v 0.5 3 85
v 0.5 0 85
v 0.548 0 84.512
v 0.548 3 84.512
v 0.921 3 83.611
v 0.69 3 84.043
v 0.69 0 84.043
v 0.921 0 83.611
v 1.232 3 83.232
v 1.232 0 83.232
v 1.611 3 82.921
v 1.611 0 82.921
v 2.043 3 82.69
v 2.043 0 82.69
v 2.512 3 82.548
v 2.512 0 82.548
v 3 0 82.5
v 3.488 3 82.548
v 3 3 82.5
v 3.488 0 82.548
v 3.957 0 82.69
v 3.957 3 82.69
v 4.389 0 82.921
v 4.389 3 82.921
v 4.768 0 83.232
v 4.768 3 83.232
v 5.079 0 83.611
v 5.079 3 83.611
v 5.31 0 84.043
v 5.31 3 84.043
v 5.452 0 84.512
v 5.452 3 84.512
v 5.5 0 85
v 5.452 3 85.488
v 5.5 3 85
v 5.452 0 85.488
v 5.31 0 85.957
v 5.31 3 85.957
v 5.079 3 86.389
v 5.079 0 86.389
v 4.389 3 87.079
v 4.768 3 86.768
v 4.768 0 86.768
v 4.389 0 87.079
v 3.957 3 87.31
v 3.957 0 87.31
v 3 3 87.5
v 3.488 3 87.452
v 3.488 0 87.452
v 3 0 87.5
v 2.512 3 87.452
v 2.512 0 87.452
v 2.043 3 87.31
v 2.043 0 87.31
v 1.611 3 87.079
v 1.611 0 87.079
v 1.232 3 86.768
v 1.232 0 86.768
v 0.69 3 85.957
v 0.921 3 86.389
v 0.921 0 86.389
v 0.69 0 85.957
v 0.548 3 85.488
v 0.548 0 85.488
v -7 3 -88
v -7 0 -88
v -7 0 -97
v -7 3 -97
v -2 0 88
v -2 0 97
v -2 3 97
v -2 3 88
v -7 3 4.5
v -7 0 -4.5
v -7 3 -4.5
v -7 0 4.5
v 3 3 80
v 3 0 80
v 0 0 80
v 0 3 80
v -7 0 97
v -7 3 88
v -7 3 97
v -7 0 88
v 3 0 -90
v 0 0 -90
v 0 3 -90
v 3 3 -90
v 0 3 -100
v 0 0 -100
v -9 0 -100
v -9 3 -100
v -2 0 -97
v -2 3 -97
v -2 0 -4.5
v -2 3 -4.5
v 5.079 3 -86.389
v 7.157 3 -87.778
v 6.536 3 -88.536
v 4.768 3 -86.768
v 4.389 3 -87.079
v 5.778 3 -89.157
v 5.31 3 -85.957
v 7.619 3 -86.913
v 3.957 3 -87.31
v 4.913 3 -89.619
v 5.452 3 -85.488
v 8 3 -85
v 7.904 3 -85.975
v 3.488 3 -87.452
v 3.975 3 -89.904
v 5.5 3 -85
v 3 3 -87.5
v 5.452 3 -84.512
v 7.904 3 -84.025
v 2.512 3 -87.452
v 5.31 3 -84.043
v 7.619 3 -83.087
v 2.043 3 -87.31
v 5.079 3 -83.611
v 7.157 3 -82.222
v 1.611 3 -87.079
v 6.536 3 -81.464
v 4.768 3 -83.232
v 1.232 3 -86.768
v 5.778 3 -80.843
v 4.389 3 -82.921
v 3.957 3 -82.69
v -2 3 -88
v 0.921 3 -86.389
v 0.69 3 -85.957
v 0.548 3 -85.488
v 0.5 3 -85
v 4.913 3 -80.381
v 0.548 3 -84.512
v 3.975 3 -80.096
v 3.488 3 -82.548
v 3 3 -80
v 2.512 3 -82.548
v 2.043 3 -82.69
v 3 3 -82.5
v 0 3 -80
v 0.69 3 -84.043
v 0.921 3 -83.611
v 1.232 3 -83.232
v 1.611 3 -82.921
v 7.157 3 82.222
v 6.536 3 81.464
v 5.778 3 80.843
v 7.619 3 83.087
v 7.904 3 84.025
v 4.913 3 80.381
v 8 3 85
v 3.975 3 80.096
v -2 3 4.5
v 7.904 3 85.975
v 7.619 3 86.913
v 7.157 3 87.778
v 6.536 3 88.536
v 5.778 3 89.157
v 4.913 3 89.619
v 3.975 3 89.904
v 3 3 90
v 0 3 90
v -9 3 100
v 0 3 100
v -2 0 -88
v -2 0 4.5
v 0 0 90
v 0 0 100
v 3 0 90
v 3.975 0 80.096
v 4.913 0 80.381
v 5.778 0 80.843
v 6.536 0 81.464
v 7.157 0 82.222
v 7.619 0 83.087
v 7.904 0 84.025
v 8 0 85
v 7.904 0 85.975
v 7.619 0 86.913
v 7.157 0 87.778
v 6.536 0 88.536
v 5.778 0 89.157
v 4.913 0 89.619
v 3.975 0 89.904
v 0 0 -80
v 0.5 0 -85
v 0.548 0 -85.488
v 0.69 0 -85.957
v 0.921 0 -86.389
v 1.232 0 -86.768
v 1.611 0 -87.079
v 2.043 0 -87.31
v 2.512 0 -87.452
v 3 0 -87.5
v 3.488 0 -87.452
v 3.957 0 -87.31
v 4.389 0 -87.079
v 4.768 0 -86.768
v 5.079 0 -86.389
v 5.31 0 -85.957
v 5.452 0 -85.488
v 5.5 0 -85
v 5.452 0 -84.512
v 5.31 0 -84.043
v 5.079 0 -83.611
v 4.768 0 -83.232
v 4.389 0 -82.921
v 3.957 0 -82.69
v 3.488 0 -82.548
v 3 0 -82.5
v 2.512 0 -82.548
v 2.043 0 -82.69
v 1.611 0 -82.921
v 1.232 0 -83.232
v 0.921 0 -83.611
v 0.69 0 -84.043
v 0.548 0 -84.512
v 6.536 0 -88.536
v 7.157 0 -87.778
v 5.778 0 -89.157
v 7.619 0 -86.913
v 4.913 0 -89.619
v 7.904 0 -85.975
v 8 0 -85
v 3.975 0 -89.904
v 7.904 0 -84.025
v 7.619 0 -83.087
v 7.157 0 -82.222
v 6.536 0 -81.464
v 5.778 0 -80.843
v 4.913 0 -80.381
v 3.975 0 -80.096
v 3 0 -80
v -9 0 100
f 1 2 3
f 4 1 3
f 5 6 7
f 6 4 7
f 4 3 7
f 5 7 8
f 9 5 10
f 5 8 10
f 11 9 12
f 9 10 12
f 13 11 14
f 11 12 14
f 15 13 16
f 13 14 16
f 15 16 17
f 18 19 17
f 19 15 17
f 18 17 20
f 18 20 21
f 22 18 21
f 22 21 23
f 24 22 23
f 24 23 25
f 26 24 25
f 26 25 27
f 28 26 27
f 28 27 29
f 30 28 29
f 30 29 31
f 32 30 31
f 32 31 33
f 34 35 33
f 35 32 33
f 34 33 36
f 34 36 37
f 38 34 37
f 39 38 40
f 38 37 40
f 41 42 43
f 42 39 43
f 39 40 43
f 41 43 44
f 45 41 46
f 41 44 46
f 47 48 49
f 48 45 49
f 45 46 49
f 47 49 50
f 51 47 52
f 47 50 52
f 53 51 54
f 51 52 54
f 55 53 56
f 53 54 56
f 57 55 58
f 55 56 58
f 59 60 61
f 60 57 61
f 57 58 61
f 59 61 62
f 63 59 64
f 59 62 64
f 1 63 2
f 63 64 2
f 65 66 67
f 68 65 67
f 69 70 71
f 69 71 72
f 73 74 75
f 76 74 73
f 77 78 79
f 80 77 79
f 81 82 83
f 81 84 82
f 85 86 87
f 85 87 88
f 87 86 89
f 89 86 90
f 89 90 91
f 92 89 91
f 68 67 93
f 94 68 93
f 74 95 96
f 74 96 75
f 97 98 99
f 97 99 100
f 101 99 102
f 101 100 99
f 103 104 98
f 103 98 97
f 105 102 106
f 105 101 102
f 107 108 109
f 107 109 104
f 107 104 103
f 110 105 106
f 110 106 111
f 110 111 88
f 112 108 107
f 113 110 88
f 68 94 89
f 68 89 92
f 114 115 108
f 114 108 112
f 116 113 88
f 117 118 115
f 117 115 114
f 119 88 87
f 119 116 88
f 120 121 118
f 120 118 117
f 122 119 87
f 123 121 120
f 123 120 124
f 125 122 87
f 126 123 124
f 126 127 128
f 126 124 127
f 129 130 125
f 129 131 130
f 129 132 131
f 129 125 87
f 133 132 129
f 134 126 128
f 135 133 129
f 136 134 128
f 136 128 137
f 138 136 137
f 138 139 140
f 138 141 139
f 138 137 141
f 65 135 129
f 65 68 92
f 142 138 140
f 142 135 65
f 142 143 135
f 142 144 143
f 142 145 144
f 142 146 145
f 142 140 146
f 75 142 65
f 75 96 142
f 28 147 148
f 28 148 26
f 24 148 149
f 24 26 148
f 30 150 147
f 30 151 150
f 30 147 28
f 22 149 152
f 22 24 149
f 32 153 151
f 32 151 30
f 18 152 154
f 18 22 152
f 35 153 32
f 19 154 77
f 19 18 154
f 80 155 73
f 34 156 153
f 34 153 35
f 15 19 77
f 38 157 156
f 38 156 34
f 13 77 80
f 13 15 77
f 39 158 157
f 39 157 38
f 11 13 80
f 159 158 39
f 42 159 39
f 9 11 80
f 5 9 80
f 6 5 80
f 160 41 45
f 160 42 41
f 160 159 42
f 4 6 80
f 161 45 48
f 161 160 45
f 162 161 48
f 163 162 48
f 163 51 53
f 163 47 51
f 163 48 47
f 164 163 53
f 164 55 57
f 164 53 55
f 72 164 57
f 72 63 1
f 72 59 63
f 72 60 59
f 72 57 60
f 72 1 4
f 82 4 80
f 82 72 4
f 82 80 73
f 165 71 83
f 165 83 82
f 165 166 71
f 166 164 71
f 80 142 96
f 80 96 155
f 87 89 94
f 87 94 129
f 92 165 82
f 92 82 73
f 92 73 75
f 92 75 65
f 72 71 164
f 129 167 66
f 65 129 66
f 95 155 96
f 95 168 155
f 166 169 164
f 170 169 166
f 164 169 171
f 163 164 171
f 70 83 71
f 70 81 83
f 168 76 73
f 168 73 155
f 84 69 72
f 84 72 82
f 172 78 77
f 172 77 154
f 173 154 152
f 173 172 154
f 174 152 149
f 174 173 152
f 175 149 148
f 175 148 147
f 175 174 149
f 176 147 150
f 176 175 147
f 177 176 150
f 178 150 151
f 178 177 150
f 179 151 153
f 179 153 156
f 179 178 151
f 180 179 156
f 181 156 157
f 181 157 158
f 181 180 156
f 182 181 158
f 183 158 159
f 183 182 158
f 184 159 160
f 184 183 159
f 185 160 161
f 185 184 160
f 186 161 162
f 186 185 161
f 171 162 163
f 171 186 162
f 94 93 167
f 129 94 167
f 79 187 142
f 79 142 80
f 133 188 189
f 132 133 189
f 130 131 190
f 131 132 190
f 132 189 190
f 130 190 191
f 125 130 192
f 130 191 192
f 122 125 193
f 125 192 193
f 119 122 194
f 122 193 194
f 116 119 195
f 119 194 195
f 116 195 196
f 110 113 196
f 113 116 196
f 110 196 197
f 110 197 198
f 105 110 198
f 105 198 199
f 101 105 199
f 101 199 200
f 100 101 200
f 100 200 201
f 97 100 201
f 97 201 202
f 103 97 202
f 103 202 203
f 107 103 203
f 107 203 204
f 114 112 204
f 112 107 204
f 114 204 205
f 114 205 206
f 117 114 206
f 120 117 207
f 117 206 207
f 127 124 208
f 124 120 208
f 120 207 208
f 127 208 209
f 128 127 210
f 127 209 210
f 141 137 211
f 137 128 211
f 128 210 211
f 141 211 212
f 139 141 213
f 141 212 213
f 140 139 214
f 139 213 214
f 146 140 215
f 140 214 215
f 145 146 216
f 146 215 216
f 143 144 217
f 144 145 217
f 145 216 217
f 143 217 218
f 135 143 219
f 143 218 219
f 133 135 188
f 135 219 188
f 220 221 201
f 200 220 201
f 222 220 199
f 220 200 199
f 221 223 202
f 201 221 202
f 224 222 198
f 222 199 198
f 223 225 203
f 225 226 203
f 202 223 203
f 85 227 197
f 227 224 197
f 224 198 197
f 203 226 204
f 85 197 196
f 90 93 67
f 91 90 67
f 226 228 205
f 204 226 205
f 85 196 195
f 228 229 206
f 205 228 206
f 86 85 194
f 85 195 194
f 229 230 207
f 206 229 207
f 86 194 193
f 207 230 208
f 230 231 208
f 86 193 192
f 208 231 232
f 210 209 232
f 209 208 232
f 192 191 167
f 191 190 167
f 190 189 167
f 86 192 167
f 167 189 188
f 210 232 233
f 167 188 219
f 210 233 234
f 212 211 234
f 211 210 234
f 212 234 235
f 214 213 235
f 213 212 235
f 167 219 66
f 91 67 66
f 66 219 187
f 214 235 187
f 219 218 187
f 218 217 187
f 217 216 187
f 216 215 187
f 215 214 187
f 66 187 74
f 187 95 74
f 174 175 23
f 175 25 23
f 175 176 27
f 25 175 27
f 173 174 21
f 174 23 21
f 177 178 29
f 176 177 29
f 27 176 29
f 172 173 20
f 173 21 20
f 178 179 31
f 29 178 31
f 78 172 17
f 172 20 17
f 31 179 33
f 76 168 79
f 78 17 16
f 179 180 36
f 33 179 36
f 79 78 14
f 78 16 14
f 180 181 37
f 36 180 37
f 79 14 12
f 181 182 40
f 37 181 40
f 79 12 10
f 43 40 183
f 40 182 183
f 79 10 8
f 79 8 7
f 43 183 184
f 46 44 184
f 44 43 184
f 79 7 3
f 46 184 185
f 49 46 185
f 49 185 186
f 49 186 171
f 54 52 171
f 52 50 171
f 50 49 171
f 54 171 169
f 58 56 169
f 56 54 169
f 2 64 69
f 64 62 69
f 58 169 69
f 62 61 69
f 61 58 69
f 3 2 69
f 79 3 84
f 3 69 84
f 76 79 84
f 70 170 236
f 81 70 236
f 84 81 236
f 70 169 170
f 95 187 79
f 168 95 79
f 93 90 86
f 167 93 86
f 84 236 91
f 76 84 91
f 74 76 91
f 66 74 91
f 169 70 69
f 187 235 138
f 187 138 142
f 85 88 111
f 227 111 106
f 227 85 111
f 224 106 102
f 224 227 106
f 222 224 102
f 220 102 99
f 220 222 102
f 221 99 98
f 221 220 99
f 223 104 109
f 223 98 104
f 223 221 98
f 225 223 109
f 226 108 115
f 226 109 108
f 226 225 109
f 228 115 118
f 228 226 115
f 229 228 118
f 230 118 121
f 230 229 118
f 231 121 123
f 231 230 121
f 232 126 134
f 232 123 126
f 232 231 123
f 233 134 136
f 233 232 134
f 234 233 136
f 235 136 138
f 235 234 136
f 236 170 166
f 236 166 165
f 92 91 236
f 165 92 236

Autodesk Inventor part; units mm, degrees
ref_plane "YZ Plane" through (0, 0, 0) normal (1, 0, 0) x (0, 1, 0)
ref_plane "XZ Plane" through (0, 0, 0) normal (0, 1, 0) x (-1, 0, 0)
ref_plane "XY Plane" through (0, 0, 0) normal (0, 0, 1) x (1, 0, 0)
sketch "草圖1" plane through (0, 0, 0) normal (0, 1, 0) x (-1, 0, 0)
  line L0 (0, 80) -> (9, 80)
  line L1 (9, 80) -> (9, -80)
  line L2 (9, -80) -> (0, -80)
  line L3 (0, -80) -> (0, 80)
  line L4 (7, 4.5) -> (2, 4.5)
  line L5 (2, 4.5) -> (2, -4.5)
  line L6 (2, -4.5) -> (7, -4.5)
  line L7 (7, -4.5) -> (7, 4.5)
  line L8 (9, 80) -> (9, 90)
  line L9 (9, 90) -> (-3, 90)
  line L10 (-8, 85) -> (-8, 85)
  line L11 (-3, 80) -> (0, 80)
  arc A0 (-8, 85) -> (-3, 80) centre (-3, 85) ccw
  arc A1 (-3, 90) -> (-8, 85) centre (-3, 85) ccw
  circle A2 centre (-3, 85) radius 2.5
  line L12 (9, 0) -> (0, 0)
  line L13 (9, -80) -> (9, -90)
  line L14 (9, -90) -> (-3, -90)
  line L15 (-3, -80) -> (0, -80)
  arc A3 (-3, -80) -> (-8, -85) centre (-3, -85) ccw
  arc A4 (-8, -85) -> (-3, -90) centre (-3, -85) ccw
  circle A5 centre (-3, -85) radius 2.5
  line L16 (9, 90) -> (0, 90)
  line L17 (0, 90) -> (0, 100)
  line L18 (0, 100) -> (9, 100)
  line L19 (9, 100) -> (9, 90)
  line L20 (9, -90) -> (0, -90)
  line L21 (0, -90) -> (0, -100)
  line L22 (0, -100) -> (9, -100)
  line L23 (9, -100) -> (9, -90)
  line L24 (7, 97) -> (2, 97)
  line L25 (2, 97) -> (2, 88)
  line L26 (2, 88) -> (7, 88)
  line L27 (7, 88) -> (7, 97)
  line L28 (7, -97) -> (2, -97)
  line L29 (2, -97) -> (2, -88)
  line L30 (2, -88) -> (7, -88)
  line L31 (7, -88) -> (7, -97)
  point P0 (7, 0)
  point P1 (4.5, 4.5)
  point P2 (4.5, 80)
  point P3 (-8, 90)
  point P4 (-8, -90)
  point P5 (-8, -85)
  point P6 (0, -90)
  point P7 (4.5, 97)
  point P8 (4.5, 100)
  point P9 (4.5, -97)
  dimension "d0" = 160
  dimension "d1" = 9
  dimension "d2" = 9
  dimension "d3" = 5
  dimension "d4" = 10
  dimension "d5" = 17
  dimension "d6" = 5
  dimension "d7" = 5
  dimension "d8" = 5
  dimension "d11" = 10
  dimension "d12" = 9
  dimension "d13" = 9
  dimension "d14" = 10
  dimension "d15" = 5
  dimension "d16" = 9
  dimension "d17" = 3
extrude "擠出1" add sketch "草圖1" along normal blind 3 contours L11 A0 A1 L9 L25 L26 L27 L8 L0 | L0 L1 L12 L7 L4 L5 L3 | L12 L5 L6 L7 L1 L2 L3 | L9 L27 L24 L25 L17 L18 L19 | L2 L13 L14 L31 L30 L29 A4 A3 L15 | L23 L22 L21 L14 L29 L28 L31
properties part number "upper_Bar" material "MDF Medium Density Fiberboard"
